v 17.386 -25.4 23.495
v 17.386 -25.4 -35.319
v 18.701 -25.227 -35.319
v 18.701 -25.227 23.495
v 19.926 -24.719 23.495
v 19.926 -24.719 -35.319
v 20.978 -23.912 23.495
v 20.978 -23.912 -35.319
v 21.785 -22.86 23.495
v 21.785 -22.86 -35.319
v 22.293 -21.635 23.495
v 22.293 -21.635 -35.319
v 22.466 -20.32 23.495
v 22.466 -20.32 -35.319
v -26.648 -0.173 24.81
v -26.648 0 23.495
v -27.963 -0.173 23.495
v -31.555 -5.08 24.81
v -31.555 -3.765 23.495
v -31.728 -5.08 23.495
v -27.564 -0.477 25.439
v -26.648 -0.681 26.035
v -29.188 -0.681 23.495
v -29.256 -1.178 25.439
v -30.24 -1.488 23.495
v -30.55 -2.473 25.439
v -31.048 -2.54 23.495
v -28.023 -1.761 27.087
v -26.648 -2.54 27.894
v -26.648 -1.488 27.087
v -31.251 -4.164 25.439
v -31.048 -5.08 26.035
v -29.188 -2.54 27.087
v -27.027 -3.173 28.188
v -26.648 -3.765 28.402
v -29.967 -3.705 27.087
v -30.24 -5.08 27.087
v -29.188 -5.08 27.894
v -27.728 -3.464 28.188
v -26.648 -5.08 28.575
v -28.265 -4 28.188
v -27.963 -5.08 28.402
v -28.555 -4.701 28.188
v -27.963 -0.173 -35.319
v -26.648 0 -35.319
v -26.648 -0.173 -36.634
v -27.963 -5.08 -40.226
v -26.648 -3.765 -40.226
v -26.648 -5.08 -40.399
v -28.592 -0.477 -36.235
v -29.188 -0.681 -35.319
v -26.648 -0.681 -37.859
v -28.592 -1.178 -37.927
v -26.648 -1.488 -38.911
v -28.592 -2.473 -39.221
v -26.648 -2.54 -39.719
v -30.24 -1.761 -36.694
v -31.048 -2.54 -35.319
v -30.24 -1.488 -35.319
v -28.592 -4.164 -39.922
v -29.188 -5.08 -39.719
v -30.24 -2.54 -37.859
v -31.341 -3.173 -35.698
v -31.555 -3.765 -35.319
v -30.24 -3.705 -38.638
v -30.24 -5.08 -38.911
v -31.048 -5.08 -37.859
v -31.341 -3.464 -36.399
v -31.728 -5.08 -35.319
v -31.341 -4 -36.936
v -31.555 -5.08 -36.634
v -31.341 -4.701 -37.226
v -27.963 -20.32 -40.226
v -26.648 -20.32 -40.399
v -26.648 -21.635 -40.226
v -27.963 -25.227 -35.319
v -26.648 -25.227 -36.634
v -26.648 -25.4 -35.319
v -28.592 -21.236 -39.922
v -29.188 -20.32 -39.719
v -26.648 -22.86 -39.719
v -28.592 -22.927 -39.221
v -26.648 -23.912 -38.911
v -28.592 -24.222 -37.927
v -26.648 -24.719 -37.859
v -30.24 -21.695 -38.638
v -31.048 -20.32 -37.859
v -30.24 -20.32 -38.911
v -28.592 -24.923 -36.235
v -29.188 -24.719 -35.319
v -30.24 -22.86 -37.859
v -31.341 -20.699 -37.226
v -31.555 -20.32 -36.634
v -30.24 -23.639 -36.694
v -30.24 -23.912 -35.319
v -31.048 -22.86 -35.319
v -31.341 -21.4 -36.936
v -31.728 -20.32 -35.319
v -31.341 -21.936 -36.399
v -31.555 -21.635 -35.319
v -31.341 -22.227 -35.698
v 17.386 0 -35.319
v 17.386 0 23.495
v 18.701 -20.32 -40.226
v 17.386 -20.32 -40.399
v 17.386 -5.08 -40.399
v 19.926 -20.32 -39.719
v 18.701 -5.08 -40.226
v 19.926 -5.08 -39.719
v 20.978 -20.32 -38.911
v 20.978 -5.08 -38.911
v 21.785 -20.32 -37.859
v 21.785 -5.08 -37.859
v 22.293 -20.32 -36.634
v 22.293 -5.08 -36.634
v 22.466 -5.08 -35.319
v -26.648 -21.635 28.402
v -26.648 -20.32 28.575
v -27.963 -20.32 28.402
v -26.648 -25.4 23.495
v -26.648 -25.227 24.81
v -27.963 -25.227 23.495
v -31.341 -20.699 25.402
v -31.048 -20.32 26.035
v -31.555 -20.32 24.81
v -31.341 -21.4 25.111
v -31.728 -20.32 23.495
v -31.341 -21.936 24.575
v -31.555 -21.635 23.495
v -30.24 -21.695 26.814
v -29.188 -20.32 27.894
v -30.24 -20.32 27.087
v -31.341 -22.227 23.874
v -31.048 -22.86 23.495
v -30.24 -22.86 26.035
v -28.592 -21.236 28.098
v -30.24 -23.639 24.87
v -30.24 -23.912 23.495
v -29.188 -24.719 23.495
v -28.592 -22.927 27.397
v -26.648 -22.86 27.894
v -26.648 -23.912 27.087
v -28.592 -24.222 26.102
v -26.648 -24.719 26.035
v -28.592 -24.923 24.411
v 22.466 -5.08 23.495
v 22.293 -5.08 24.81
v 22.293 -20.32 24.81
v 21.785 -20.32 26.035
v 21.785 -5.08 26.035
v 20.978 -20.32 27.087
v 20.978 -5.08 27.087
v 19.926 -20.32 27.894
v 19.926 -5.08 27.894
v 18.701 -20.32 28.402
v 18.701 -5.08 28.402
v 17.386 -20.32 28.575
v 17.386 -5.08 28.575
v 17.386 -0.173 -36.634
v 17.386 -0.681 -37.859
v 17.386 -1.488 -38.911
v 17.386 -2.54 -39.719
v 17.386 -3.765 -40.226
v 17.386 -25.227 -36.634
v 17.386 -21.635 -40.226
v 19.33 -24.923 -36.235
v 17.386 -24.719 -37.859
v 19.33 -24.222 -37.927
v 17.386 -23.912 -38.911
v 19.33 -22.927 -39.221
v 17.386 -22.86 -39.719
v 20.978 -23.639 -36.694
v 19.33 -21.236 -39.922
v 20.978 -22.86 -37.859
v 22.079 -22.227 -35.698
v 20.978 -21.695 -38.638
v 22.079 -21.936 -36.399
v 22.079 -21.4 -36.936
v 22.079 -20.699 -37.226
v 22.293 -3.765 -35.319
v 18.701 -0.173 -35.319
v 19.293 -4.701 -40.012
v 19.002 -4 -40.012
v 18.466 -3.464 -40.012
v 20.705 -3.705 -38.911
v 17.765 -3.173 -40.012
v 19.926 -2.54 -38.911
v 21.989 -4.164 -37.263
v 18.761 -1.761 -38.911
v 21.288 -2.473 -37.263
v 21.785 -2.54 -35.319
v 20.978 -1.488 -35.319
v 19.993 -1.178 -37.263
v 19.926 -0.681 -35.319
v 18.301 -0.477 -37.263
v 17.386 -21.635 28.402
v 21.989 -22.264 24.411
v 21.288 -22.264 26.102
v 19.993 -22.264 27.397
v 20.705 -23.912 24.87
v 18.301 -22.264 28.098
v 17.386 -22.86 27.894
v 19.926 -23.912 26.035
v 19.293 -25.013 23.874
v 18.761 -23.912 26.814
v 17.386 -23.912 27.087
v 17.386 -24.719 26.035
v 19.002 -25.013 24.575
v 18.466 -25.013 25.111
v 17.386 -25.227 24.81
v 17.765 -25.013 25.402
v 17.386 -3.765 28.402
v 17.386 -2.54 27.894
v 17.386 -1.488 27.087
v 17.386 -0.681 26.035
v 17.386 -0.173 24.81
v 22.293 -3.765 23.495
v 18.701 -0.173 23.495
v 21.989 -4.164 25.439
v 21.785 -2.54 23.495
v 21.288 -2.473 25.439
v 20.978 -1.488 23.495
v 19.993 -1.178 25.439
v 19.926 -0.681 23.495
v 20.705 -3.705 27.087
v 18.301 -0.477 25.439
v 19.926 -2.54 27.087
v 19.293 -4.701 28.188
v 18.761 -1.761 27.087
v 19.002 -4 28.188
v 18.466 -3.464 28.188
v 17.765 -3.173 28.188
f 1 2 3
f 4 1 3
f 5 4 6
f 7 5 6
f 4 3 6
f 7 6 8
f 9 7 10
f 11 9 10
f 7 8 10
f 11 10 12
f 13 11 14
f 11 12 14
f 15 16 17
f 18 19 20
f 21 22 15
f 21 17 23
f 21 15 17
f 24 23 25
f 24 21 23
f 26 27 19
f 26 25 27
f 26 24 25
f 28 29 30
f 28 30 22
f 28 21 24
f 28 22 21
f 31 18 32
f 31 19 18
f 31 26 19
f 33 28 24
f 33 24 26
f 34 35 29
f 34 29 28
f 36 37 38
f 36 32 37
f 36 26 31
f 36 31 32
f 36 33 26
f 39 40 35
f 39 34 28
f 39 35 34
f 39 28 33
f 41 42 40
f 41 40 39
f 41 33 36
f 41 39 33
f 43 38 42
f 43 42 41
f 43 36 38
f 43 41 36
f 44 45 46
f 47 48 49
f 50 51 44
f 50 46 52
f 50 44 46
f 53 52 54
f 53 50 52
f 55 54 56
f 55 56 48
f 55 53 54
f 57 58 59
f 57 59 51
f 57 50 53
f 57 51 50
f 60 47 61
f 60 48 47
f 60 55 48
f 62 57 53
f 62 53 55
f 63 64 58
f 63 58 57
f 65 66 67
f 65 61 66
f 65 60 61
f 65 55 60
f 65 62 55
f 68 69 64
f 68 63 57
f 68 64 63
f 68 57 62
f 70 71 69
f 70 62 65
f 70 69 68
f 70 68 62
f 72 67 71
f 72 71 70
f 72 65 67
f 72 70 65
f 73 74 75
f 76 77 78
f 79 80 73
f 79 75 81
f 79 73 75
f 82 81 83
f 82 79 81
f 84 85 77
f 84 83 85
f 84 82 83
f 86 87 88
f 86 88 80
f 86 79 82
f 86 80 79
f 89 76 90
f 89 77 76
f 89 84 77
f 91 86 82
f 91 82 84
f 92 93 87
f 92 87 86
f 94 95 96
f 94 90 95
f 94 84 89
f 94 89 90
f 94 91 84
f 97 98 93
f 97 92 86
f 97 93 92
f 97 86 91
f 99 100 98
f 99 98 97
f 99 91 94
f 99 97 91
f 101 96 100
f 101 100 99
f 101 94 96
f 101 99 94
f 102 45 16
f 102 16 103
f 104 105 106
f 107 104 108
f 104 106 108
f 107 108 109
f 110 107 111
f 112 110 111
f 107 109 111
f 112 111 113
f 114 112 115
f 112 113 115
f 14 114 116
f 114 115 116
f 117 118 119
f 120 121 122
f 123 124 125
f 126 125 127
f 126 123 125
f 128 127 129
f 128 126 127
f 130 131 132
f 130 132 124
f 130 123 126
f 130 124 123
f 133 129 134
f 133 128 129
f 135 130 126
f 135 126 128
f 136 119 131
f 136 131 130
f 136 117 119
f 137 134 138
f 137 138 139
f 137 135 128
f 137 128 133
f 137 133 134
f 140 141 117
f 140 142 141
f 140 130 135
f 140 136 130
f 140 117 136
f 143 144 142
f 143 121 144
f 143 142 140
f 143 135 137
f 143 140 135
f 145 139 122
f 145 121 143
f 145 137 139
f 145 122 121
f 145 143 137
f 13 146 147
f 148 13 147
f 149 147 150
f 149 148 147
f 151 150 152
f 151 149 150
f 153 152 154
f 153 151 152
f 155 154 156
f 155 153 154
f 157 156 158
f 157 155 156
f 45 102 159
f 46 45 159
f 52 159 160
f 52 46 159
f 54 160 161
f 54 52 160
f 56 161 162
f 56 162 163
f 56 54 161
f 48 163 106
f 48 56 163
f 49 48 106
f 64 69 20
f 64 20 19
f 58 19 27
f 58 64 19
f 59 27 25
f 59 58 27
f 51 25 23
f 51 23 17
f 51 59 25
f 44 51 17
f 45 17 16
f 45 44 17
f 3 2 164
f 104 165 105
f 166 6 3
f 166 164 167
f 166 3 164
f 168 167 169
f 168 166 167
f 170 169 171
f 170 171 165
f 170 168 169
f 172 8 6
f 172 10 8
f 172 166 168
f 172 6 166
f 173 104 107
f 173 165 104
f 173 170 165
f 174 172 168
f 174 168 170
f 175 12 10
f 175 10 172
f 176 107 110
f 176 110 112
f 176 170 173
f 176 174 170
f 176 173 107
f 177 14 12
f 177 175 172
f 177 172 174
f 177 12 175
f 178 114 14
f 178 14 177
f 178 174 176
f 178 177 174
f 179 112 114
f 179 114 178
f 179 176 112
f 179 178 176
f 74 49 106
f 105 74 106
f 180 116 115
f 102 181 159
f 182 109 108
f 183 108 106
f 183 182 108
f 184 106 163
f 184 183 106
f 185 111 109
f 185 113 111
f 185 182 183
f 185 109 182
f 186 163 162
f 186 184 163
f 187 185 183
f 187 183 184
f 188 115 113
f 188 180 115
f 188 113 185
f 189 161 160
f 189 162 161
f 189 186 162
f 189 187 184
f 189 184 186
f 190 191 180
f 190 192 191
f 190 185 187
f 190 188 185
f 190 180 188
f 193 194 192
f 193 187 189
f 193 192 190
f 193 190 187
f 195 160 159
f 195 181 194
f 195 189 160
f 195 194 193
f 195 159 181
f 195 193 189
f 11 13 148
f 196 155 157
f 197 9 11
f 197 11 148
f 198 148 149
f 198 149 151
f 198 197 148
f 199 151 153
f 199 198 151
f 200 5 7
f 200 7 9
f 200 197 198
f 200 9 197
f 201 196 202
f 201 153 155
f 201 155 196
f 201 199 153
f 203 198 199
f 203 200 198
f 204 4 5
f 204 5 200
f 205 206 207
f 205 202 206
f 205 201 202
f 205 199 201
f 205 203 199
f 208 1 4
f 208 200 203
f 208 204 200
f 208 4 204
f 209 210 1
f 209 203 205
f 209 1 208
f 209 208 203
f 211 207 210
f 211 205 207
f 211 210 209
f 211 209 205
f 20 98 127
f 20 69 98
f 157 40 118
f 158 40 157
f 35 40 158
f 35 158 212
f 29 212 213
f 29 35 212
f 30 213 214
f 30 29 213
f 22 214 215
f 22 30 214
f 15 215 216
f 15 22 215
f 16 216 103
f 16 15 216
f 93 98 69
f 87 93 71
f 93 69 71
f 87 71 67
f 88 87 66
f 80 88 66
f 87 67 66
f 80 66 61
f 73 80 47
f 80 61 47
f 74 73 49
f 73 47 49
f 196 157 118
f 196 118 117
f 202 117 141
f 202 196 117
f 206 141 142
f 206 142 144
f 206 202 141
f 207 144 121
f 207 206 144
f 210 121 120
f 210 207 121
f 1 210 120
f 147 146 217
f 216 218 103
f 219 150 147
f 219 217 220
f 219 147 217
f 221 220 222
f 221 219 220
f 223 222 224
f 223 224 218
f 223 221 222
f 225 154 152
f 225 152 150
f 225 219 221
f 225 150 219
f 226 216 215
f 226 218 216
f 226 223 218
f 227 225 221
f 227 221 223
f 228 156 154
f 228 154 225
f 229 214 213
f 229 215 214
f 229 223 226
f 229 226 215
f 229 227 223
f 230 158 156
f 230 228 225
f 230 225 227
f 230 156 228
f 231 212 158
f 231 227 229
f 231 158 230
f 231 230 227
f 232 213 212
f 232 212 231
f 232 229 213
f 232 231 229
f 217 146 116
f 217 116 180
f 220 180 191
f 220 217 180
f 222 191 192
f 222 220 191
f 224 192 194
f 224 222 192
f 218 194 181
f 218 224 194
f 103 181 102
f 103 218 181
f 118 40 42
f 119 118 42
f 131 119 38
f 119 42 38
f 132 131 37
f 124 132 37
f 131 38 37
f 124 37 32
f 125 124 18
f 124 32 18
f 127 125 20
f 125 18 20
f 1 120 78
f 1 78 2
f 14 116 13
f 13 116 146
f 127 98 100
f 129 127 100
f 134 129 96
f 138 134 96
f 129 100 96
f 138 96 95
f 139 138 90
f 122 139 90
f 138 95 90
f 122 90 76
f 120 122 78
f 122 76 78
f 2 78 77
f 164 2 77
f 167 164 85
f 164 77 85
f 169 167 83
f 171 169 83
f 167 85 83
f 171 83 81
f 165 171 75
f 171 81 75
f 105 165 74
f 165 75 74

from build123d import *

# Parameters (mm, degrees)
F0_W         = 54.1939660907
F0_H         = 68.9741391689
F1_DEPTH     = 25.4
F2_R         = 5.08
F3_T1_DEPTH  = 58.8141391689
F3_T3_DEPTH  = 44.0339660907
F3_T5_DEPTH  = 15.24
F3_S9_W      = 5.08
F3_S9_H      = 5.08
F3_T10_DEPTH = 5.08
F3_S15_W     = 5.08
F3_S15_H     = 5.08
F3_T16_DEPTH = 5.08
F3_S21_W     = 5.08
F3_S21_H     = 5.08
F3_T22_DEPTH = 5.08
F3_S27_W     = 5.08
F3_S27_H     = 5.08
F3_T28_DEPTH = 5.08
F3_S33_W     = 5.08
F3_S33_H     = 5.08
F3_T34_DEPTH = 5.08
F3_S39_W     = 5.08
F3_S39_H     = 5.08
F3_T40_DEPTH = 5.08
F3_T44_ANGLE = 90
F3_T46_ANGLE = 90


# Not quite as in the source:
# - a fillet or chamfer that OpenCascade refuses, or shapes differently, is made with other operations: its cross-section is extruded or revolved along the edge and cut away or added


with BuildPart() as f1:
    # F0 (on Front) → F1 (new body)
    with BuildSketch(Plane.XZ):
        with Locations((-4.6311207116, -5.9120682999)):
            Rectangle(F0_W, F0_H)
    extrude(amount=F1_DEPTH)

    # F2
    f2_edges = [f1.edges().sort_by_distance(p)[0] for p in [
        (22.465862, -12.7, 28.575001),
        (22.465862, 0, -5.912068),
        (-4.631121, -25.4, 28.575001),
    ]]
    fillet(f2_edges, radius=F2_R)

    # F3: fillet of radius 5.08 on 8 edges, made by hand

    # F3_s2 → F3_t1 (cut)
    with BuildSketch(Plane.XY.offset(-35.3191378844)):
        with BuildLine():
            ThreePointArc((17.3858623338, -25.4), (20.9779647822, -23.9121024484), (22.4658623338, -20.32))
            Line((22.4658623338, -20.32), (22.4658623338, -25.4))
            Line((22.4658623338, -25.4), (17.3858623338, -25.4))
        make_face()
        with BuildLine():
            ThreePointArc((-31.7281037569, -5.08), (-30.2402062053, -1.4878975516), (-26.6481037569, 0))
            Line((-26.6481037569, 0), (-31.7281037569, 0))
            Line((-31.7281037569, 0), (-31.7281037569, -5.08))
        make_face()
        with BuildLine():
            ThreePointArc((-31.7281037569, -20.32), (-30.2402062053, -23.9121024484), (-26.6481037569, -25.4))
            Line((-26.6481037569, -25.4), (-31.7281037569, -25.4))
            Line((-31.7281037569, -25.4), (-31.7281037569, -20.32))
        make_face()
    extrude(amount=F3_T1_DEPTH, mode=Mode.SUBTRACT)

    # F3_s4 → F3_t3 (cut)
    with BuildSketch(Plane.YZ.offset(-26.6481037569)):
        with BuildLine():
            ThreePointArc((-5.08, 28.5750012845), (-1.4878975516, 27.0871037329), (0, 23.4950012845))
            Line((0, 23.4950012845), (0, 28.5750012845))
            Line((0, 28.5750012845), (-5.08, 28.5750012845))
        make_face()
        with BuildLine():
            ThreePointArc((-25.4, -35.3191378844), (-23.9121024484, -38.9112403328), (-20.32, -40.3991378844))
            Line((-20.32, -40.3991378844), (-25.4, -40.3991378844))
            Line((-25.4, -40.3991378844), (-25.4, -35.3191378844))
        make_face()
        with BuildLine():
            ThreePointArc((0, -35.3191378844), (-1.4878975516, -38.9112403328), (-5.08, -40.3991378844))
            Line((-5.08, -40.3991378844), (0, -40.3991378844))
            Line((0, -40.3991378844), (0, -35.3191378844))
        make_face()
    extrude(amount=F3_T3_DEPTH, mode=Mode.SUBTRACT)

    # F3_s6 → F3_t5 (cut)
    with BuildSketch(Plane.XZ.offset(5.08)):
        with BuildLine():
            ThreePointArc((-26.6481037569, 28.5750012845), (-30.2402062053, 27.0871037329), (-31.7281037569, 23.4950012845))
            Line((-31.7281037569, 23.4950012845), (-31.7281037569, 28.5750012845))
            Line((-31.7281037569, 28.5750012845), (-26.6481037569, 28.5750012845))
        make_face()
        with BuildLine():
            ThreePointArc((17.3858623338, -40.3991378844), (20.9779647822, -38.9112403328), (22.4658623338, -35.3191378844))
            Line((22.4658623338, -35.3191378844), (22.4658623338, -40.3991378844))
            Line((22.4658623338, -40.3991378844), (17.3858623338, -40.3991378844))
        make_face()
        with BuildLine():
            ThreePointArc((-31.7281037569, -35.3191378844), (-30.2402062053, -38.9112403328), (-26.6481037569, -40.3991378844))
            Line((-26.6481037569, -40.3991378844), (-31.7281037569, -40.3991378844))
            Line((-31.7281037569, -40.3991378844), (-31.7281037569, -35.3191378844))
        make_face()
    extrude(amount=F3_T5_DEPTH, mode=Mode.SUBTRACT)


with BuildPart() as f3_tool8:
    # F3_s9 → F3_t10 (new body)
    with BuildSketch(Plane.XY.offset(23.4950012845)):
        with Locations((19.9258623338, -2.54)):
            Rectangle(F3_S9_W, F3_S9_H)
    extrude(amount=F3_T10_DEPTH)

    # F3_s11 → F3_t12 (revolve, cut)
    with BuildSketch(Plane(origin=(17.3858623338, -5.08, 23.4950012845), x_dir=(-0.7071067812, -0.7071067812, 0), z_dir=(-0.7071067812, 0.7071067812, 0))):
        with BuildLine():
            ThreePointArc((0, -5.08), (5.08, 0), (0, 5.08))
            Line((0, 5.08), (0, -5.08))
        make_face()
    revolve(axis=Axis((17.3858623338, -5.08, 23.4950012845), (0, 0, 1)), mode=Mode.SUBTRACT)


with BuildPart() as f1_1:
    add(f1.part)

    # F3_t7: cut F3_tool8
    add(f3_tool8.part, mode=Mode.SUBTRACT)


with BuildPart() as f3_tool14:
    # F3_s15 → F3_t16 (new body)
    with BuildSketch(Plane.XZ.offset(20.32)):
        with Locations((19.9258623338, 26.0350012845)):
            Rectangle(F3_S15_W, F3_S15_H)
    extrude(amount=F3_T16_DEPTH)

    # F3_s17 → F3_t18 (revolve, cut)
    with BuildSketch(Plane(origin=(17.3858623338, -20.32, 23.4950012845), x_dir=(-0.7071067812, 0, -0.7071067812), z_dir=(-0.7071067812, 0, 0.7071067812))):
        with BuildLine():
            ThreePointArc((0, -5.08), (5.08, 0), (0, 5.08))
            Line((0, 5.08), (0, -5.08))
        make_face()
    revolve(axis=Axis((17.3858623338, -20.32, 23.4950012845), (0, -1, 0)), mode=Mode.SUBTRACT)


with BuildPart() as f1_2:
    add(f1_1.part)

    # F3_t13: cut F3_tool14
    add(f3_tool14.part, mode=Mode.SUBTRACT)


with BuildPart() as f3_tool20:
    # F3_s21 → F3_t22 (new body)
    with BuildSketch(Plane.YZ.offset(17.3858623338)):
        with Locations((-22.86, -37.8591378844)):
            Rectangle(F3_S21_W, F3_S21_H)
    extrude(amount=F3_T22_DEPTH)

    # F3_s23 → F3_t24 (revolve, cut)
    with BuildSketch(Plane(origin=(17.3858623338, -20.32, -35.3191378844), x_dir=(0, 0.7071067812, 0.7071067812), z_dir=(0, 0.7071067812, -0.7071067812))):
        with BuildLine():
            ThreePointArc((0, -5.08), (5.08, 0), (0, 5.08))
            Line((0, 5.08), (0, -5.08))
        make_face()
    revolve(axis=Axis((17.3858623338, -20.32, -35.3191378844), (1, 0, 0)), mode=Mode.SUBTRACT)


with BuildPart() as f1_3:
    add(f1_2.part)

    # F3_t19: cut F3_tool20
    add(f3_tool20.part, mode=Mode.SUBTRACT)


with BuildPart() as f3_tool26:
    # F3_s27 → F3_t28 (new body)
    with BuildSketch(Plane.XY.offset(23.4950012845)):
        with Locations((-29.1881037569, -2.54)):
            Rectangle(F3_S27_W, F3_S27_H)
    extrude(amount=F3_T28_DEPTH)

    # F3_s29 → F3_t30 (revolve, cut)
    with BuildSketch(Plane(origin=(-26.6481037569, -5.08, 23.4950012845), x_dir=(0.7071067812, -0.7071067812, 0), z_dir=(-0.7071067812, -0.7071067812, 0))):
        with BuildLine():
            ThreePointArc((0, -5.08), (5.08, 0), (0, 5.08))
            Line((0, 5.08), (0, -5.08))
        make_face()
    revolve(axis=Axis((-26.6481037569, -5.08, 23.4950012845), (0, 0, 1)), mode=Mode.SUBTRACT)


with BuildPart() as f1_4:
    add(f1_3.part)

    # F3_t25: cut F3_tool26
    add(f3_tool26.part, mode=Mode.SUBTRACT)


with BuildPart() as f3_tool32:
    # F3_s33 → F3_t34 (new body)
    with BuildSketch(Plane.YZ.offset(-26.6481037569)):
        with Locations((-2.54, -37.8591378844)):
            Rectangle(F3_S33_W, F3_S33_H)
    extrude(amount=-F3_T34_DEPTH)

    # F3_s35 → F3_t36 (revolve, cut)
    with BuildSketch(Plane(origin=(-26.6481037569, -5.08, -35.3191378844), x_dir=(0, -0.7071067812, 0.7071067812), z_dir=(0, -0.7071067812, -0.7071067812))):
        with BuildLine():
            ThreePointArc((0, -5.08), (5.08, 0), (0, 5.08))
            Line((0, 5.08), (0, -5.08))
        make_face()
    revolve(axis=Axis((-26.6481037569, -5.08, -35.3191378844), (-1, 0, 0)), mode=Mode.SUBTRACT)


with BuildPart() as f1_5:
    add(f1_4.part)

    # F3_t31: cut F3_tool32
    add(f3_tool32.part, mode=Mode.SUBTRACT)


with BuildPart() as f3_tool38:
    # F3_s39 → F3_t40 (new body)
    with BuildSketch(Plane.YZ.offset(-26.6481037569)):
        with Locations((-22.86, -37.8591378844)):
            Rectangle(F3_S39_W, F3_S39_H)
    extrude(amount=-F3_T40_DEPTH)

    # F3_s41 → F3_t42 (revolve, cut)
    with BuildSketch(Plane(origin=(-26.6481037569, -20.32, -35.3191378844), x_dir=(0, 0.7071067812, 0.7071067812), z_dir=(0, -0.7071067812, 0.7071067812))):
        with BuildLine():
            ThreePointArc((0, -5.08), (5.08, 0), (0, 5.08))
            Line((0, 5.08), (0, -5.08))
        make_face()
    revolve(axis=Axis((-26.6481037569, -20.32, -35.3191378844), (-1, 0, 0)), mode=Mode.SUBTRACT)


with BuildPart() as f1_6:
    add(f1_5.part)

    # F3_t37: cut F3_tool38
    add(f3_tool38.part, mode=Mode.SUBTRACT)

    # F3_s43 → F3_t44 (revolve, cut)
    with BuildSketch(Plane.XZ.offset(5.08)):
        with BuildLine():
            ThreePointArc((17.3858623338, -40.3991378844), (20.9779647822, -38.9112403328), (22.4658623338, -35.3191378844))
            Line((22.4658623338, -35.3191378844), (22.4658623338, -40.3991378844))
            Line((22.4658623338, -40.3991378844), (17.3858623338, -40.3991378844))
        make_face()
    revolve(axis=Axis((17.3858623338, -5.08, -40.3991378844), (0, 0, 1)), revolution_arc=F3_T44_ANGLE, mode=Mode.SUBTRACT)

    # F3_s45 → F3_t46 (revolve, cut)
    with BuildSketch(Plane.XZ.offset(20.32)):
        with BuildLine():
            ThreePointArc((-31.7281037569, 23.4950012845), (-30.2402062053, 27.0871037329), (-26.6481037569, 28.5750012845))
            Line((-26.6481037569, 28.5750012845), (-31.7281037569, 28.5750012845))
            Line((-31.7281037569, 28.5750012845), (-31.7281037569, 23.4950012845))
        make_face()
    revolve(axis=Axis((-31.7281037569, -20.32, 23.4950012845), (1, 0, 0)), revolution_arc=F3_T46_ANGLE, mode=Mode.SUBTRACT)


solid = f1_6.part
